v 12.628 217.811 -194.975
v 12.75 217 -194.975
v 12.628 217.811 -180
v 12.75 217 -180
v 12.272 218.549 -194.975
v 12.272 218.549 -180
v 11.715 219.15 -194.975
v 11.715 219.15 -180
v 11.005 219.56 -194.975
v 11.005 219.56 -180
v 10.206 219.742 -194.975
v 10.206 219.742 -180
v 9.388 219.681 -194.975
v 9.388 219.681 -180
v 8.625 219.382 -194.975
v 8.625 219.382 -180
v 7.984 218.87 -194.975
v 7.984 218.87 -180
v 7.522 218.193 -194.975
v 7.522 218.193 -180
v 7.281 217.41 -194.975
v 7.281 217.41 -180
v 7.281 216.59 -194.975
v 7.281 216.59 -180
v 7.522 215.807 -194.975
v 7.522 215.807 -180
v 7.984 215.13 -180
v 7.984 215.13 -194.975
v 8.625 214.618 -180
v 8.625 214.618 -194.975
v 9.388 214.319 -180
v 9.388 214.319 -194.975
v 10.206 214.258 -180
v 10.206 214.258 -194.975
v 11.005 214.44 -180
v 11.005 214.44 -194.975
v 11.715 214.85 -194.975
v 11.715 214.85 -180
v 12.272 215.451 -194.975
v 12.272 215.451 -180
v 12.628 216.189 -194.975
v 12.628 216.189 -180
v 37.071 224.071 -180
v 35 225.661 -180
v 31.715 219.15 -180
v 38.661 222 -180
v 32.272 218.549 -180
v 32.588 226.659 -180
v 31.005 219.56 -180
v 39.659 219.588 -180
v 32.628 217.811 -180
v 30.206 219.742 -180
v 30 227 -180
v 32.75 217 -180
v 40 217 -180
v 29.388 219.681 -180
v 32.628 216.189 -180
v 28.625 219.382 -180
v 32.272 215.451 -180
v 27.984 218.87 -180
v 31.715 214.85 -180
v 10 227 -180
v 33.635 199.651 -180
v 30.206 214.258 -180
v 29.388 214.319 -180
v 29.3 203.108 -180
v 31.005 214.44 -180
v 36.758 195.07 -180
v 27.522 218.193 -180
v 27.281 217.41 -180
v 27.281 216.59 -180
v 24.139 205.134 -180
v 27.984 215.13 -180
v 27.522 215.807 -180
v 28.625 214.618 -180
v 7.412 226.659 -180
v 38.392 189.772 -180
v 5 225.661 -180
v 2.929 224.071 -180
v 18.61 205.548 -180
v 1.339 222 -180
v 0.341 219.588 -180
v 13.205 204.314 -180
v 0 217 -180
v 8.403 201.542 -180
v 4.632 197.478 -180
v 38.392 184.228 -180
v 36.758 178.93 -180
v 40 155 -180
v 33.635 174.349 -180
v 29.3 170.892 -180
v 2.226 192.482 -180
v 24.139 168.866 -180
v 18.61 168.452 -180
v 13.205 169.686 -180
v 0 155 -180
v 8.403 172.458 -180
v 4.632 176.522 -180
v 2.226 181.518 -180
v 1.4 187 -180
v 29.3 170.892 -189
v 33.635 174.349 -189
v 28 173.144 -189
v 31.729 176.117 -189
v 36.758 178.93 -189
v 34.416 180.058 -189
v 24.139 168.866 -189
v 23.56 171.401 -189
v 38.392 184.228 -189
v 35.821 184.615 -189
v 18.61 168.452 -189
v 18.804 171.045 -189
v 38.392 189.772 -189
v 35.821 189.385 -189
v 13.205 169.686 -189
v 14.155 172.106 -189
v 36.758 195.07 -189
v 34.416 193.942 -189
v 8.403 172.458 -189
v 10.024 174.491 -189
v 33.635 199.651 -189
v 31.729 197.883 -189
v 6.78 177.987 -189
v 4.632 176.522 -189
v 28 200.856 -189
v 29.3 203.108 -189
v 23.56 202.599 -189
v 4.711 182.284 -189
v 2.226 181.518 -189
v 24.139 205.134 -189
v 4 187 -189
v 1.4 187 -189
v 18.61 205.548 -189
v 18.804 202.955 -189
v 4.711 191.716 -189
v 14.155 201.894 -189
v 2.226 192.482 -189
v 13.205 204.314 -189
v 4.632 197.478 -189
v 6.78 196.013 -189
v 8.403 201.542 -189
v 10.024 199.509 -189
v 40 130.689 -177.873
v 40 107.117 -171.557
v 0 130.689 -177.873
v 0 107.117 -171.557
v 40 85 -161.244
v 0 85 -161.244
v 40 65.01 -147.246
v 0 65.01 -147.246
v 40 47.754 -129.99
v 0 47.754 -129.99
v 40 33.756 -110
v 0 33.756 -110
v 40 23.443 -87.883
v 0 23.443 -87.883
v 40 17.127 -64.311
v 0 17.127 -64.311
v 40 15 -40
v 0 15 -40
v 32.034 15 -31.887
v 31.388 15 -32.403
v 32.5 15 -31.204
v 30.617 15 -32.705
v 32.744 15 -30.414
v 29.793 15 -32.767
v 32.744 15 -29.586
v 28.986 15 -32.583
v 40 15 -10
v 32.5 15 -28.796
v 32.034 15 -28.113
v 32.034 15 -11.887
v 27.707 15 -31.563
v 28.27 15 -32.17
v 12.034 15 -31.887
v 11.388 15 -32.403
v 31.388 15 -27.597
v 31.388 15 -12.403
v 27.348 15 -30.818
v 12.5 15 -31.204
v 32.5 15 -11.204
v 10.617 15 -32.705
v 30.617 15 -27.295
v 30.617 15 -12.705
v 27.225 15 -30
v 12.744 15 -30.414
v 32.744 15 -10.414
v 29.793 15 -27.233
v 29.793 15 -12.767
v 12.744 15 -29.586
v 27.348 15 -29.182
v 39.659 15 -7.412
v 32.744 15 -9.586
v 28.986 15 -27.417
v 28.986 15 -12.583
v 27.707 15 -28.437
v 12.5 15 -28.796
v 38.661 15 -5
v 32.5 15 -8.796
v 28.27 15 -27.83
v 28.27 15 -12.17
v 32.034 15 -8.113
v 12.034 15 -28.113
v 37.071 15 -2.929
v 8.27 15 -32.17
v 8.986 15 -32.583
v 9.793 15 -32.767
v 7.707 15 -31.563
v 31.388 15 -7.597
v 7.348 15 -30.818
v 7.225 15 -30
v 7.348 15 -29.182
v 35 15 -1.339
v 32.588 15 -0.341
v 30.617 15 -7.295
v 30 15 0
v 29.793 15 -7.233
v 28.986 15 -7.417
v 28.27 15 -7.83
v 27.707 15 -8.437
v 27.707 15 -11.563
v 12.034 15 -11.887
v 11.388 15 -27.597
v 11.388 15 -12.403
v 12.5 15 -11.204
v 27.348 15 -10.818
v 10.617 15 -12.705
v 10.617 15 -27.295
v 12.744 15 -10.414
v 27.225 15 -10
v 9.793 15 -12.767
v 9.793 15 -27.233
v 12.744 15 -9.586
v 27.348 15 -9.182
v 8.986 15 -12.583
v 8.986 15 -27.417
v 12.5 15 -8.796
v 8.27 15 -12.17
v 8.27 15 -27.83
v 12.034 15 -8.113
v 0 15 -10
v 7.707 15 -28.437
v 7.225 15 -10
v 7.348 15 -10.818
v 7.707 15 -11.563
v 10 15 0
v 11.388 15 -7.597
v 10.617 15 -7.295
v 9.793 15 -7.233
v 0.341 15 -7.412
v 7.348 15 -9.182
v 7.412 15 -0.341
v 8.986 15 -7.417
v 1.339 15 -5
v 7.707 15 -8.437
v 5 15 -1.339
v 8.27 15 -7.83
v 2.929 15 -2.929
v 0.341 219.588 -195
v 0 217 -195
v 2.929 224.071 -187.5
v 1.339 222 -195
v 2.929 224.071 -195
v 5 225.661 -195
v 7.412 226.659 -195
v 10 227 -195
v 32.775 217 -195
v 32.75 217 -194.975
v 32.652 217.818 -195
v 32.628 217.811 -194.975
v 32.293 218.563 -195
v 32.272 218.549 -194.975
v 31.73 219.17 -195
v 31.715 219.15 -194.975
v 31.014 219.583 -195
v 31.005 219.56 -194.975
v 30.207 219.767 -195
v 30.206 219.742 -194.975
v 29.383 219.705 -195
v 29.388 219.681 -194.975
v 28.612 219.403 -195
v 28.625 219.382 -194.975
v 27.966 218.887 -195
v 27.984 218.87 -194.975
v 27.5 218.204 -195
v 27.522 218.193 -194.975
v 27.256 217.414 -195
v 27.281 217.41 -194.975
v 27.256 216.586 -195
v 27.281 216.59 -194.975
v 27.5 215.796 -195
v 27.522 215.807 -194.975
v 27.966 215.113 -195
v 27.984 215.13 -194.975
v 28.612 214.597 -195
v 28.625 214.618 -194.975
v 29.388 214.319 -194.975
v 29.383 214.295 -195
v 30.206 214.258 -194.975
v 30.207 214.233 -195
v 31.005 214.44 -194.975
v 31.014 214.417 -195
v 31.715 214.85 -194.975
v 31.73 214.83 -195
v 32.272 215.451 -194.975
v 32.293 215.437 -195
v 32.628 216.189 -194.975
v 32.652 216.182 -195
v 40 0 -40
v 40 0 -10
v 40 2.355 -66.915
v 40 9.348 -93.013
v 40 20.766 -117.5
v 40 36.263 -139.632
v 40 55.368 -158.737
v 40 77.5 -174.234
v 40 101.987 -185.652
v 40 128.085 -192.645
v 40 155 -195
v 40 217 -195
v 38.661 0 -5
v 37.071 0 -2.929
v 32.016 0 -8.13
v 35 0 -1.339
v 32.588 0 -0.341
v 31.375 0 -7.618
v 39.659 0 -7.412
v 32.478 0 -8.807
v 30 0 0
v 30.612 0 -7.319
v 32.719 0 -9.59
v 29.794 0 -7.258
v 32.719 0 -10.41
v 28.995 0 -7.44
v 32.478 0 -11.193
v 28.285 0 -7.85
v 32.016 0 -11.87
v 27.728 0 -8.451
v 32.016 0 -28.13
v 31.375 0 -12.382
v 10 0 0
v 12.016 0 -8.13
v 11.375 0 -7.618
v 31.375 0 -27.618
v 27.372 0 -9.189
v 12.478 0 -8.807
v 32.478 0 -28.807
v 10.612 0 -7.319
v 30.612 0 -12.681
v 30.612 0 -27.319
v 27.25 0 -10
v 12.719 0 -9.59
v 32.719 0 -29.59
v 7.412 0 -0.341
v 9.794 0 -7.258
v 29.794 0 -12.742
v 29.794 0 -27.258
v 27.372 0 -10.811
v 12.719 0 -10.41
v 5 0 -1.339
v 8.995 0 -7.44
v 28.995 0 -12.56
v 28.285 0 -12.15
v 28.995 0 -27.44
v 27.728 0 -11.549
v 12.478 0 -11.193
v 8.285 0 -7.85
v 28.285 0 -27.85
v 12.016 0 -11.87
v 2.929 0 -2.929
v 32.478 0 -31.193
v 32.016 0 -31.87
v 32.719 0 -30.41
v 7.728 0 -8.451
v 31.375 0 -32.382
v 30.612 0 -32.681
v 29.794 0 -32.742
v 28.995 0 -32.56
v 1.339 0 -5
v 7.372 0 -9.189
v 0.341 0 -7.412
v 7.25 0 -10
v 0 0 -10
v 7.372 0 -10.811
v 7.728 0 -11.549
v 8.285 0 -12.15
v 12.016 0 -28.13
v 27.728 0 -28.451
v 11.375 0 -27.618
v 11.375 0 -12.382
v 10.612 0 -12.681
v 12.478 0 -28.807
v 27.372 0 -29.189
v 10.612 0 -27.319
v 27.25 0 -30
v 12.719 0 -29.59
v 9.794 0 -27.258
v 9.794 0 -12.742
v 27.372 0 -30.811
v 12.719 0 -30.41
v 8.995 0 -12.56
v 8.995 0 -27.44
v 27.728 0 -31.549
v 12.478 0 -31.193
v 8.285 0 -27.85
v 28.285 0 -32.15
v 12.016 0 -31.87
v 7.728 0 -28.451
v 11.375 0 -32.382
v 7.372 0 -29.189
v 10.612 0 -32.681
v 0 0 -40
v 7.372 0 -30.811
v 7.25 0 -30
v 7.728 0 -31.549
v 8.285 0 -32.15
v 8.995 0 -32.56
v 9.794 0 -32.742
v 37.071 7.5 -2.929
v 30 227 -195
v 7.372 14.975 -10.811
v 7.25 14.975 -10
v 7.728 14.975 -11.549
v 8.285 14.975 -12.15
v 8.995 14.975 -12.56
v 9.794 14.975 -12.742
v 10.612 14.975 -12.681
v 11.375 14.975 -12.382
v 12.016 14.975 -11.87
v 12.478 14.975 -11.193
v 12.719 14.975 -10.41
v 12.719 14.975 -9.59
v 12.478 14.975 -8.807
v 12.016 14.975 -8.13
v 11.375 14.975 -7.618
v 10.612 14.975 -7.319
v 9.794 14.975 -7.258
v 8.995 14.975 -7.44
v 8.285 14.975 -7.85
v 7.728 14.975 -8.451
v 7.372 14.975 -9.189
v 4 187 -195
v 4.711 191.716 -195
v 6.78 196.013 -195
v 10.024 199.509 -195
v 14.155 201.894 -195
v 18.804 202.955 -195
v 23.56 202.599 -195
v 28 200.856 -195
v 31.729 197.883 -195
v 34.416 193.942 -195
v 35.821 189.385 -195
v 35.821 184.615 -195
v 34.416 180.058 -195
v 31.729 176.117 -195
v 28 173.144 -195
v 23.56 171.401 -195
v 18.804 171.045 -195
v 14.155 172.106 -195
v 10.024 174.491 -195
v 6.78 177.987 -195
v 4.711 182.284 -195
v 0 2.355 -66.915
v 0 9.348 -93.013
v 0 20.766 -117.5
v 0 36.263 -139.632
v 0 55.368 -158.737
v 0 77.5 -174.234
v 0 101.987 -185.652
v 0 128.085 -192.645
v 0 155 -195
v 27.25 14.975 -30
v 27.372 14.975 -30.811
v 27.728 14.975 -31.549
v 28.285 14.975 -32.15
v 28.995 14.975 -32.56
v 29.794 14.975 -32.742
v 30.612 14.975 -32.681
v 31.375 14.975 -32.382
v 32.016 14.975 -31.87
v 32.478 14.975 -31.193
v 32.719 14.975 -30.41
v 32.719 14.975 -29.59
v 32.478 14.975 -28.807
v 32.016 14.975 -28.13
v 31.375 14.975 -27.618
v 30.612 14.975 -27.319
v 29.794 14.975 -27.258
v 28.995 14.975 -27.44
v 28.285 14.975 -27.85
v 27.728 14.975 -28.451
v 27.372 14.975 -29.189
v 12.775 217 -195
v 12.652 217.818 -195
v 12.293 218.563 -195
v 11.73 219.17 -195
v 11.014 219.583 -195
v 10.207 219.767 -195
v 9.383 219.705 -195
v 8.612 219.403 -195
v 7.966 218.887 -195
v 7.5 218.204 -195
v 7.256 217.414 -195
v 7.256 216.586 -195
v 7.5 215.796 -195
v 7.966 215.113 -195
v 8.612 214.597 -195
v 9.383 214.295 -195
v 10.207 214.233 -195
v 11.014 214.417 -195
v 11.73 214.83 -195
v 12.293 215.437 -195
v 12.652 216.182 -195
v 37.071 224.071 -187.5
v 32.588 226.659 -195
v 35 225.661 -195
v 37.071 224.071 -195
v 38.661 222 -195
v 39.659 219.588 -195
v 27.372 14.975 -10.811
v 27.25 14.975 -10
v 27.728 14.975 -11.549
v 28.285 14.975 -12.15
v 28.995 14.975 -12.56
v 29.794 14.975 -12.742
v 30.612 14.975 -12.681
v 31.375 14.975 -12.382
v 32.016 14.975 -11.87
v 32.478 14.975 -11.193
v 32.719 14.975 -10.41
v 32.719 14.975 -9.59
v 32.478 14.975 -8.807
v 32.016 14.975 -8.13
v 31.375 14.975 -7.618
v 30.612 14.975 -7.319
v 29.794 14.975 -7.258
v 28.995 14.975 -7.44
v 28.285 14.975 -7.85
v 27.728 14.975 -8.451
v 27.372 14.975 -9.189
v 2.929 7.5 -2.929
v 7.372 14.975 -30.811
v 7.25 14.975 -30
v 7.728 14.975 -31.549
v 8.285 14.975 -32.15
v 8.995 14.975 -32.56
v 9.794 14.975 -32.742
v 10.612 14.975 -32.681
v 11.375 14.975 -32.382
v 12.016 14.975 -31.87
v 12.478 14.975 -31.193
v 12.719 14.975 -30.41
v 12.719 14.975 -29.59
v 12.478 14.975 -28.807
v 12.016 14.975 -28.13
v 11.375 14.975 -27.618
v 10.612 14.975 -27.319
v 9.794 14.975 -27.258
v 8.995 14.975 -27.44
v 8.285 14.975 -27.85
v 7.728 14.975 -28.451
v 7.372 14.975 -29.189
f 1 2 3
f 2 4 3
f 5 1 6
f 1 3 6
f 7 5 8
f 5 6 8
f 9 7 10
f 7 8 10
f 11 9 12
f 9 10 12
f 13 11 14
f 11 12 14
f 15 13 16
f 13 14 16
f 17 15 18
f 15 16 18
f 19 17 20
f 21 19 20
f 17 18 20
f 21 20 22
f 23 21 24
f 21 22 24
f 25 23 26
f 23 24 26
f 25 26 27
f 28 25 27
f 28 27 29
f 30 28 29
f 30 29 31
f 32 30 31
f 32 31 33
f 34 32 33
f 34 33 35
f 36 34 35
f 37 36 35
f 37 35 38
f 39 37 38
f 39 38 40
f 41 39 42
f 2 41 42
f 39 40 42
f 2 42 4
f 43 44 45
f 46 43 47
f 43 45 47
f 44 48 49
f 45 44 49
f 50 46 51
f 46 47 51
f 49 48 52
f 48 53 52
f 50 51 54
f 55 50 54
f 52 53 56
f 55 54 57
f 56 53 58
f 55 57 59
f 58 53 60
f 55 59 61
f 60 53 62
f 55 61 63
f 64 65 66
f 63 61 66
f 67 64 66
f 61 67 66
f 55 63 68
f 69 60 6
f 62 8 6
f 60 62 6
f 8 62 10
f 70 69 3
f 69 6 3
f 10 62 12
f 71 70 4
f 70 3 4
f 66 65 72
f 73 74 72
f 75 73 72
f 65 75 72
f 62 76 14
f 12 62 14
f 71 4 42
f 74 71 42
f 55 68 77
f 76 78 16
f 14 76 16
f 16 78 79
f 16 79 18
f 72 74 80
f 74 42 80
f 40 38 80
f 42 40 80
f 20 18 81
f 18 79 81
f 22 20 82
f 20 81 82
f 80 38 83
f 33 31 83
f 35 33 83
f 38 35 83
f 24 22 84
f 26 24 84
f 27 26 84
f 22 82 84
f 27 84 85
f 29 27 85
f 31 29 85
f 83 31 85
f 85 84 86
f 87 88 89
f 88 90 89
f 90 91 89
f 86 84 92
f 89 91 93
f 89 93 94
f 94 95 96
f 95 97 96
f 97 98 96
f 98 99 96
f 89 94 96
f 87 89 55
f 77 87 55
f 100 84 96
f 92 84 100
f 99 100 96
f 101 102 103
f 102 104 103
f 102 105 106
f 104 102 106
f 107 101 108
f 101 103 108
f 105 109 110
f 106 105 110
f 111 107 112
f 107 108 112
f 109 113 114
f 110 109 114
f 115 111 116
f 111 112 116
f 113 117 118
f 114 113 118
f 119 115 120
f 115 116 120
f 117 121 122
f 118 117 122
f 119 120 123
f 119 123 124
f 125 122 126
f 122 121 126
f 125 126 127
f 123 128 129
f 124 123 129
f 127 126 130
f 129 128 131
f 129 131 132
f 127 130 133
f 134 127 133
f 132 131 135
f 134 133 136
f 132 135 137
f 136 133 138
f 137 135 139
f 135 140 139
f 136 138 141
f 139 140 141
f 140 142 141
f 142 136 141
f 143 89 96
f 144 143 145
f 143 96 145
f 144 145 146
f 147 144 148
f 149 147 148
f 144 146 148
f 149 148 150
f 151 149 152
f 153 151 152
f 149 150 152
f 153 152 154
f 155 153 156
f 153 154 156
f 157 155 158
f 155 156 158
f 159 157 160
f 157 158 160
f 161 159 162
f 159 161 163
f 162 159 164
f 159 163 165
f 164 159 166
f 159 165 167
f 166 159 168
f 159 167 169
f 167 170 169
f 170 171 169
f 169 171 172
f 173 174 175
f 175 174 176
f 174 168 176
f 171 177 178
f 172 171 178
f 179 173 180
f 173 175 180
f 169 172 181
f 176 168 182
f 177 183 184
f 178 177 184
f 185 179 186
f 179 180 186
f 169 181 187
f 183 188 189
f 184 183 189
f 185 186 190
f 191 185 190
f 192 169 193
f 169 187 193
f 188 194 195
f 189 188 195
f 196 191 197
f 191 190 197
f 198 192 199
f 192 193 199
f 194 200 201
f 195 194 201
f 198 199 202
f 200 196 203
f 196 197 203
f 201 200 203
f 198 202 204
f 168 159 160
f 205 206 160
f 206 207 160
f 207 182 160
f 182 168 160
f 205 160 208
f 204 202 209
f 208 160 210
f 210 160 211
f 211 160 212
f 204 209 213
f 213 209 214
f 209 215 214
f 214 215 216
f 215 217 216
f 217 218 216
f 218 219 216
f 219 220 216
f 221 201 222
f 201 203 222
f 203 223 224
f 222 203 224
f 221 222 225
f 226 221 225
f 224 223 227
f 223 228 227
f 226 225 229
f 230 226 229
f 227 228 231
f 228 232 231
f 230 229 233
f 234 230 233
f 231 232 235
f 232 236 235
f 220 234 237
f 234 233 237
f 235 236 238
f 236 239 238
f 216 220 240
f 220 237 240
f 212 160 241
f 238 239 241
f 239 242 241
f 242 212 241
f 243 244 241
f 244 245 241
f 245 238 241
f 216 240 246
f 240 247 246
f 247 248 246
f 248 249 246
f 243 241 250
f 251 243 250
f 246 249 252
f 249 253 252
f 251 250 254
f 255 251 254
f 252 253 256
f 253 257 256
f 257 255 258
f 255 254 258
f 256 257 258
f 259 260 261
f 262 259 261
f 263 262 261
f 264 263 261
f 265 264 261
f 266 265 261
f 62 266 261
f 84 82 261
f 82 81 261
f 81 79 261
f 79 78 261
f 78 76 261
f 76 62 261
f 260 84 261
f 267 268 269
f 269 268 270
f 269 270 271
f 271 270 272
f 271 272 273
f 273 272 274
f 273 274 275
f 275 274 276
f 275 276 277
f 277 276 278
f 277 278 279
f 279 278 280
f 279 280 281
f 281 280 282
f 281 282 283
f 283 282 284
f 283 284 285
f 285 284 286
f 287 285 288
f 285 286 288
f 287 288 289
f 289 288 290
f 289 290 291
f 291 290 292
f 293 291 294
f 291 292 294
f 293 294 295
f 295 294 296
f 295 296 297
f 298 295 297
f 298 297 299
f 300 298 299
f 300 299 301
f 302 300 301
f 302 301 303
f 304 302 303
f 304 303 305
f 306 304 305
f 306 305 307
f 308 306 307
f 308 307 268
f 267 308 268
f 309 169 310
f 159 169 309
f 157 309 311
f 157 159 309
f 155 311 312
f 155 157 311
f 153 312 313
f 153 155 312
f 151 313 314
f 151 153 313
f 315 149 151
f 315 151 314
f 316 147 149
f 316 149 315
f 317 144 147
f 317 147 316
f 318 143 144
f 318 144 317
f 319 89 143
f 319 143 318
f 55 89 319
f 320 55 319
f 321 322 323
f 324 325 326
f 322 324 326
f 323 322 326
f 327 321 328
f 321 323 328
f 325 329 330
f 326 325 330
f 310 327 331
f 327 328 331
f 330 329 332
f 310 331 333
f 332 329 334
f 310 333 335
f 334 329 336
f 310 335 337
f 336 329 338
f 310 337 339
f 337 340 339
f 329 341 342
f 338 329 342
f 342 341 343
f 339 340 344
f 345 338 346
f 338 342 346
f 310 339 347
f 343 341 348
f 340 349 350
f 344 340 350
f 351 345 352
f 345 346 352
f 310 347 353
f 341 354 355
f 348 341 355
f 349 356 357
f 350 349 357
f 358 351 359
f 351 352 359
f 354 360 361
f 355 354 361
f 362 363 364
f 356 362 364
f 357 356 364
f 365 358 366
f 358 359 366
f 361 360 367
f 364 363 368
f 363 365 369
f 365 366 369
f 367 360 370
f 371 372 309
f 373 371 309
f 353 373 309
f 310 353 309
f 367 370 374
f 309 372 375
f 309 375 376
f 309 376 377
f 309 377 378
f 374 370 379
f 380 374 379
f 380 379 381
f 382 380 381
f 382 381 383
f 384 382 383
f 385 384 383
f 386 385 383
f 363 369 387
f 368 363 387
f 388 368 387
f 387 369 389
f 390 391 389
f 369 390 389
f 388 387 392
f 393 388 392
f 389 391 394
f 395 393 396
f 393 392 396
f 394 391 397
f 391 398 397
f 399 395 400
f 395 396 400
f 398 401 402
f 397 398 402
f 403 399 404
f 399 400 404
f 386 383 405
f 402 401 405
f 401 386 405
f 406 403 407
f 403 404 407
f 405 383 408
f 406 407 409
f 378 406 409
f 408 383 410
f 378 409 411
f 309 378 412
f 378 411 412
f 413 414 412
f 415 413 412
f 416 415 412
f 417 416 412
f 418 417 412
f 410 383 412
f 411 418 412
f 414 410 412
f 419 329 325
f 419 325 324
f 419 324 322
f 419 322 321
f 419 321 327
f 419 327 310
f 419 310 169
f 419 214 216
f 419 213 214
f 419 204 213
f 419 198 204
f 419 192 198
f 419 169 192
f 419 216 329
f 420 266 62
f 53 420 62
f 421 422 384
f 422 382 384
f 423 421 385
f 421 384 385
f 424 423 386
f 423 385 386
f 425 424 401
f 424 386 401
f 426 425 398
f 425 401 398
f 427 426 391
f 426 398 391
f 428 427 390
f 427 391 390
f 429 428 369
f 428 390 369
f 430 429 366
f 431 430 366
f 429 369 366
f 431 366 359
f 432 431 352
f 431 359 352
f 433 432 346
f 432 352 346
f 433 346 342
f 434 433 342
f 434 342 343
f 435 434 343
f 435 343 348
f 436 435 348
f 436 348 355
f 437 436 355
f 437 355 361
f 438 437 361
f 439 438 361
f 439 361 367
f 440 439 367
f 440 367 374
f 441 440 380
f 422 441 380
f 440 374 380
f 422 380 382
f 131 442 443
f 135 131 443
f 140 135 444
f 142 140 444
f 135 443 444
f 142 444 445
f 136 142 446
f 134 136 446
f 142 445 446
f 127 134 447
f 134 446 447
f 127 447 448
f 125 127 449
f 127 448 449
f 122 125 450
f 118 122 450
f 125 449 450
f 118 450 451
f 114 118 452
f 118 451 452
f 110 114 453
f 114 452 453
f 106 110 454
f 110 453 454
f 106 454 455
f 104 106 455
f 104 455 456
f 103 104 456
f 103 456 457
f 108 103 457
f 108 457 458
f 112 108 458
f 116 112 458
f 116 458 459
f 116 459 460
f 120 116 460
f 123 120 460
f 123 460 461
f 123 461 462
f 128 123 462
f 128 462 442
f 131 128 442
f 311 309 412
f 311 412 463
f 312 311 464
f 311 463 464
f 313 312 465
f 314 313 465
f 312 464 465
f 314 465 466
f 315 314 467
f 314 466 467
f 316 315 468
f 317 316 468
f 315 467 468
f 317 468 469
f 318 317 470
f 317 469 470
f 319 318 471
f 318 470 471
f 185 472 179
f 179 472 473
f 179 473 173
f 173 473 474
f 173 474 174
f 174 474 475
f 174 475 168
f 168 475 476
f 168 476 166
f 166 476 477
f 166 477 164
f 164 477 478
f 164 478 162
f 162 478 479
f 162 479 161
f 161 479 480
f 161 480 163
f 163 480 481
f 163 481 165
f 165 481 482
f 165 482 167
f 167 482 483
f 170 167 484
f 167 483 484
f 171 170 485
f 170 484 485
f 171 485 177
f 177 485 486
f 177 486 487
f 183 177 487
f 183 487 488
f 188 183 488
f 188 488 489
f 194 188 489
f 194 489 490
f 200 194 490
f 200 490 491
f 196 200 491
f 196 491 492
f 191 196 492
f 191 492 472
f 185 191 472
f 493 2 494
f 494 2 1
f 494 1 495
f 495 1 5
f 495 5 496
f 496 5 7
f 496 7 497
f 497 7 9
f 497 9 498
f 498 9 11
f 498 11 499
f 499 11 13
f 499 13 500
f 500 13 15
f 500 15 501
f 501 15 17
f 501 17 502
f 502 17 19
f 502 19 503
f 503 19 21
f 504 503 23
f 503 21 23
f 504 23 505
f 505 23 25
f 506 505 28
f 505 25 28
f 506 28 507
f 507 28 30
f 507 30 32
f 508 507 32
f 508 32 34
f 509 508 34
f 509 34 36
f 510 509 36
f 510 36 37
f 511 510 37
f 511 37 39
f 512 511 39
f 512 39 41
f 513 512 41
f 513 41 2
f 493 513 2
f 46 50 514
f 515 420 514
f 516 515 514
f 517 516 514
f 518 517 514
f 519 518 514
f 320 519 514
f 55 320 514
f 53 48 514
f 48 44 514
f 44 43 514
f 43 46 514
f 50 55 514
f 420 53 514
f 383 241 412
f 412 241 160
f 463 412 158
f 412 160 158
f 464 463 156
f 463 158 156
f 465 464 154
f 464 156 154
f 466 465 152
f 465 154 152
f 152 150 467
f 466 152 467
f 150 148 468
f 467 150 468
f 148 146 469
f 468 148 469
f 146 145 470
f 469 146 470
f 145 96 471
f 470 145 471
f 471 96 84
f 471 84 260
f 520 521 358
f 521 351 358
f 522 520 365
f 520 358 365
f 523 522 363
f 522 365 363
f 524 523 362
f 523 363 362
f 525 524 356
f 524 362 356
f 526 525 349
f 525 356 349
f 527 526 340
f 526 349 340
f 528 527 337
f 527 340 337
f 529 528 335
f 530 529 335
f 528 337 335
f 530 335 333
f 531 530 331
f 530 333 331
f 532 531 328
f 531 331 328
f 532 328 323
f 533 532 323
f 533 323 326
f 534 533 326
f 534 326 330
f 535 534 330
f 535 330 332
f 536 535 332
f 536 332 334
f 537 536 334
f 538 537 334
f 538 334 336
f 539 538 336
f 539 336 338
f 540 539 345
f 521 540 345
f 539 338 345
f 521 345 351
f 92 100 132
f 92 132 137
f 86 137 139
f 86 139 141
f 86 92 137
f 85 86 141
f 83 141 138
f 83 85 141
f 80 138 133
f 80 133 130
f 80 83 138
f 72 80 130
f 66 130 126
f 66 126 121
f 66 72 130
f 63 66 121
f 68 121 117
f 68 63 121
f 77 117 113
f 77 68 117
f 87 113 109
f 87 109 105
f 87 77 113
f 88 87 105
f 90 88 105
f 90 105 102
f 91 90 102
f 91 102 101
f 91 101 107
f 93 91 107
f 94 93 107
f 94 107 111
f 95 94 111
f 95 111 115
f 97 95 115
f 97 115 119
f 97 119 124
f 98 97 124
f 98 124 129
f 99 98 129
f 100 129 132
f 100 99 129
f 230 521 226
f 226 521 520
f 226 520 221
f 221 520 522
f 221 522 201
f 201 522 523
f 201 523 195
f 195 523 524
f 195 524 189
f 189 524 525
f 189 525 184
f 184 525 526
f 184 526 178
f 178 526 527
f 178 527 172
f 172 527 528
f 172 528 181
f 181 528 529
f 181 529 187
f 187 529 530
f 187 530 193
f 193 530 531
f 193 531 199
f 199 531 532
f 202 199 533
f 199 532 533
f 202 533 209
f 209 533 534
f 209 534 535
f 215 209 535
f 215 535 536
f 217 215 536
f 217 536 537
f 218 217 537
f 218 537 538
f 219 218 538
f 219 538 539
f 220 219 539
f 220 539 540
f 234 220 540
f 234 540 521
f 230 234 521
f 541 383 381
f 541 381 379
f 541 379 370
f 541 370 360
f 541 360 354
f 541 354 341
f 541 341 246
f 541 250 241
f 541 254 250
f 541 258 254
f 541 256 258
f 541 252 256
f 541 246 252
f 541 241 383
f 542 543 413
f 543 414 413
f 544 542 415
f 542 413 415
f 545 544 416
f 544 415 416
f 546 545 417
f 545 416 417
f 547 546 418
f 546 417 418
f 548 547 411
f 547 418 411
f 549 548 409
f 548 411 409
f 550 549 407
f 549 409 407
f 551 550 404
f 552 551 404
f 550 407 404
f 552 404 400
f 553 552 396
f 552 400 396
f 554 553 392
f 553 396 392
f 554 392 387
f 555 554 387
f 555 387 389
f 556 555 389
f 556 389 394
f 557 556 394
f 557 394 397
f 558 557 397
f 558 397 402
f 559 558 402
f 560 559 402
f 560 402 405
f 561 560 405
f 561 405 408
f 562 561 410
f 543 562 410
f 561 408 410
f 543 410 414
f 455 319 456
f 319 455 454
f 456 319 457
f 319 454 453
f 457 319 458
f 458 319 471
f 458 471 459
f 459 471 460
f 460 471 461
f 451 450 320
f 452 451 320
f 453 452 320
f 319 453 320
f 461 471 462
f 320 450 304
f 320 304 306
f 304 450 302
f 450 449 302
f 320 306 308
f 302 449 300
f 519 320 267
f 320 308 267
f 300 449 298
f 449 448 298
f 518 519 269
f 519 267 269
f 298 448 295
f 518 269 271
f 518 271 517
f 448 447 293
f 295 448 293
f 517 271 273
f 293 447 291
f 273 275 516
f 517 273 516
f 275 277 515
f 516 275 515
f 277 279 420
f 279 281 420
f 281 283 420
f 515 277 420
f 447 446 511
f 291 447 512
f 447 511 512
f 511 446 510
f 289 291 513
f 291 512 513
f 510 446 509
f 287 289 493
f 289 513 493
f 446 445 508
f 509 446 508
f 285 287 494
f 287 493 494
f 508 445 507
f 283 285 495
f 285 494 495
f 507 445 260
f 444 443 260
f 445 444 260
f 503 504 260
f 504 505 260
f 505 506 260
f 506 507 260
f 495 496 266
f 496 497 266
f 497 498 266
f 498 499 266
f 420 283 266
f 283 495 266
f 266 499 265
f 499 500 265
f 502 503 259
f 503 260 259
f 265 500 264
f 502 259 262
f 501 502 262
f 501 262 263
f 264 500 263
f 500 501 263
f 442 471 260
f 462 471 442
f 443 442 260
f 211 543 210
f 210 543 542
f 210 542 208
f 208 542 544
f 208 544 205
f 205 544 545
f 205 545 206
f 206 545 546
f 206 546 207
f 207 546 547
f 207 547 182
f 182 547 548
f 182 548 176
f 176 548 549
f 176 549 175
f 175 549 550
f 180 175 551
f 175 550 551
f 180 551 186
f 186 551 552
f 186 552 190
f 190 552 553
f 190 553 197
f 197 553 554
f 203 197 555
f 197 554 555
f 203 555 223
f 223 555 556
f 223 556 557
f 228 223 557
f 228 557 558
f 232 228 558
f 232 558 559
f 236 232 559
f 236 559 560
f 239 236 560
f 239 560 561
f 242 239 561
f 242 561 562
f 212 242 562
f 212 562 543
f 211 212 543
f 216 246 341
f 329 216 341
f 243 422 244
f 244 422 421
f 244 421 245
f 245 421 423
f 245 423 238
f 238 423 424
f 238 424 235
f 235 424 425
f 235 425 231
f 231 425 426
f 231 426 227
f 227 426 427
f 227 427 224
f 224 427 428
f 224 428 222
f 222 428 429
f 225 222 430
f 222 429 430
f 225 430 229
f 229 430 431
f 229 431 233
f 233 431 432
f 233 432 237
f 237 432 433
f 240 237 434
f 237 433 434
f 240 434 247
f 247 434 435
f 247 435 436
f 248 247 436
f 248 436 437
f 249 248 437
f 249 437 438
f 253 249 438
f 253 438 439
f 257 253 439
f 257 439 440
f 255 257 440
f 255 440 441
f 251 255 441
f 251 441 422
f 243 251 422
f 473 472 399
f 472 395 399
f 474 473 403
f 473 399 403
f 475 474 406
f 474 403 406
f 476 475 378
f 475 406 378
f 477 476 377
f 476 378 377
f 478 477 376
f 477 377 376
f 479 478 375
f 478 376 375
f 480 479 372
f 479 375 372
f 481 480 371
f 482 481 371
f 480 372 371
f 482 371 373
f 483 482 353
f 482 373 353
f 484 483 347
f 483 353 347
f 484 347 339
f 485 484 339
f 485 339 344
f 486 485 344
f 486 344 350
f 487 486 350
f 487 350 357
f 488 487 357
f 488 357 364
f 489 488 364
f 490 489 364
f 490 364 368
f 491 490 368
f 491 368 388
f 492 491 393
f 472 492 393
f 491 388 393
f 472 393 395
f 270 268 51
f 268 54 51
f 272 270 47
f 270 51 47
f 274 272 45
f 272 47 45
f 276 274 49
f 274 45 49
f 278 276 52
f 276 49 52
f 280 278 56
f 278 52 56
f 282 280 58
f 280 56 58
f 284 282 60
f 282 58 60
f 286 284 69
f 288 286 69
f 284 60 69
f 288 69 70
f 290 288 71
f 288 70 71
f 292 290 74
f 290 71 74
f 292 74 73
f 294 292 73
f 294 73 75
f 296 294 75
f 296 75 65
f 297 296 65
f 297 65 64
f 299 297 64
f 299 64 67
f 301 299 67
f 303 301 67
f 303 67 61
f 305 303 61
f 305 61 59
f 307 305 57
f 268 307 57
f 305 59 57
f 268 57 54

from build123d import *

# Parameters (mm, degrees)
BOSS_EXTRUDE2_DEPTH            = 40
M5_CLEARANCE_HOLE2_D           = 5.5
M5_CLEARANCE_HOLE2_CSINK_D     = 5.55
M5_CLEARANCE_HOLE2_CSINK_ANGLE = 90
CUT_EXTRUDE1_REACH             = 303.917
SKETCH10_R                     = 16
SKETCH11_R                     = 18.6
CUT_EXTRUDE2_DEPTH             = 9
FILLET1_R                      = 10
M5_CLEARANCE_HOLE3_D           = 5.5
M5_CLEARANCE_HOLE3_CSINK_D     = 5.55
M5_CLEARANCE_HOLE3_CSINK_ANGLE = 90


with BuildPart() as part:
    # Sketch6 → Boss-Extrude2 (new body)
    with BuildSketch(Plane(origin=(0, 0, 0), x_dir=(0, 0, -1), z_dir=(1, 0, 0))):
        with BuildLine():
            Line((0, 0), (40, 0))
            ThreePointArc((40, 0), (149.601551084, 45.398448916), (195, 155))
            Line((195, 155), (195, 227))
            Line((195, 227), (180, 227))
            Line((180, 227), (180, 155))
            ThreePointArc((180, 155), (138.994949366, 56.005050634), (40, 15))
            Line((40, 15), (0, 15))
            Line((0, 15), (0, 0))
        make_face()
    extrude(amount=BOSS_EXTRUDE2_DEPTH)

    # M5 Clearance Hole2 (through all)
    with Locations(Plane(origin=(0, 15, 0), x_dir=(1, 0, 0), z_dir=(0, 1, 0))):
        with Locations((10, 30), (30, 30), (10, 10), (30, 10)):
            CounterSinkHole(M5_CLEARANCE_HOLE2_D / 2, M5_CLEARANCE_HOLE2_CSINK_D / 2, counter_sink_angle=M5_CLEARANCE_HOLE2_CSINK_ANGLE)

    # Sketch10 → Cut-Extrude1 (cut, up to next)
    with BuildSketch(Plane(origin=(0, 0, -195), x_dir=(-1, 0, 0), z_dir=(0, 0, -1)), mode=Mode.PRIVATE) as cut_extrude1_sk1:
        with Locations((-20, 187)):
            Circle(SKETCH10_R)
    cut_extrude1_tool1 = extrude(cut_extrude1_sk1.sketch, amount=-CUT_EXTRUDE1_REACH, mode=Mode.PRIVATE) & part.part
    add(cut_extrude1_tool1.solids().sort_by_distance((20, 187, -195))[0], mode=Mode.SUBTRACT)

    # Sketch11 → Cut-Extrude2 (cut)
    with BuildSketch(Plane(origin=(0, 0, -180), x_dir=(-1, 0, 0), z_dir=(0, 0, -1))):
        with Locations((-20, 187)):
            Circle(SKETCH11_R)
    extrude(amount=CUT_EXTRUDE2_DEPTH, mode=Mode.SUBTRACT)

    # Fillet1
    fillet1_edges = [part.edges().sort_by_distance(p)[0] for p in [
        (40, 7.5, 0),
        (0, 7.5, 0),
        (40, 227, -187.5),
        (0, 227, -187.5),
    ]]
    fillet(fillet1_edges, radius=FILLET1_R)

    # M5 Clearance Hole3 (through all)
    with Locations(Plane(origin=(0, 0, -195), x_dir=(-1, 0, 0), z_dir=(0, 0, -1))):
        with Locations((-30, 217), (-10, 217)):
            CounterSinkHole(M5_CLEARANCE_HOLE3_D / 2, M5_CLEARANCE_HOLE3_CSINK_D / 2, counter_sink_angle=M5_CLEARANCE_HOLE3_CSINK_ANGLE)


solid = part.part
